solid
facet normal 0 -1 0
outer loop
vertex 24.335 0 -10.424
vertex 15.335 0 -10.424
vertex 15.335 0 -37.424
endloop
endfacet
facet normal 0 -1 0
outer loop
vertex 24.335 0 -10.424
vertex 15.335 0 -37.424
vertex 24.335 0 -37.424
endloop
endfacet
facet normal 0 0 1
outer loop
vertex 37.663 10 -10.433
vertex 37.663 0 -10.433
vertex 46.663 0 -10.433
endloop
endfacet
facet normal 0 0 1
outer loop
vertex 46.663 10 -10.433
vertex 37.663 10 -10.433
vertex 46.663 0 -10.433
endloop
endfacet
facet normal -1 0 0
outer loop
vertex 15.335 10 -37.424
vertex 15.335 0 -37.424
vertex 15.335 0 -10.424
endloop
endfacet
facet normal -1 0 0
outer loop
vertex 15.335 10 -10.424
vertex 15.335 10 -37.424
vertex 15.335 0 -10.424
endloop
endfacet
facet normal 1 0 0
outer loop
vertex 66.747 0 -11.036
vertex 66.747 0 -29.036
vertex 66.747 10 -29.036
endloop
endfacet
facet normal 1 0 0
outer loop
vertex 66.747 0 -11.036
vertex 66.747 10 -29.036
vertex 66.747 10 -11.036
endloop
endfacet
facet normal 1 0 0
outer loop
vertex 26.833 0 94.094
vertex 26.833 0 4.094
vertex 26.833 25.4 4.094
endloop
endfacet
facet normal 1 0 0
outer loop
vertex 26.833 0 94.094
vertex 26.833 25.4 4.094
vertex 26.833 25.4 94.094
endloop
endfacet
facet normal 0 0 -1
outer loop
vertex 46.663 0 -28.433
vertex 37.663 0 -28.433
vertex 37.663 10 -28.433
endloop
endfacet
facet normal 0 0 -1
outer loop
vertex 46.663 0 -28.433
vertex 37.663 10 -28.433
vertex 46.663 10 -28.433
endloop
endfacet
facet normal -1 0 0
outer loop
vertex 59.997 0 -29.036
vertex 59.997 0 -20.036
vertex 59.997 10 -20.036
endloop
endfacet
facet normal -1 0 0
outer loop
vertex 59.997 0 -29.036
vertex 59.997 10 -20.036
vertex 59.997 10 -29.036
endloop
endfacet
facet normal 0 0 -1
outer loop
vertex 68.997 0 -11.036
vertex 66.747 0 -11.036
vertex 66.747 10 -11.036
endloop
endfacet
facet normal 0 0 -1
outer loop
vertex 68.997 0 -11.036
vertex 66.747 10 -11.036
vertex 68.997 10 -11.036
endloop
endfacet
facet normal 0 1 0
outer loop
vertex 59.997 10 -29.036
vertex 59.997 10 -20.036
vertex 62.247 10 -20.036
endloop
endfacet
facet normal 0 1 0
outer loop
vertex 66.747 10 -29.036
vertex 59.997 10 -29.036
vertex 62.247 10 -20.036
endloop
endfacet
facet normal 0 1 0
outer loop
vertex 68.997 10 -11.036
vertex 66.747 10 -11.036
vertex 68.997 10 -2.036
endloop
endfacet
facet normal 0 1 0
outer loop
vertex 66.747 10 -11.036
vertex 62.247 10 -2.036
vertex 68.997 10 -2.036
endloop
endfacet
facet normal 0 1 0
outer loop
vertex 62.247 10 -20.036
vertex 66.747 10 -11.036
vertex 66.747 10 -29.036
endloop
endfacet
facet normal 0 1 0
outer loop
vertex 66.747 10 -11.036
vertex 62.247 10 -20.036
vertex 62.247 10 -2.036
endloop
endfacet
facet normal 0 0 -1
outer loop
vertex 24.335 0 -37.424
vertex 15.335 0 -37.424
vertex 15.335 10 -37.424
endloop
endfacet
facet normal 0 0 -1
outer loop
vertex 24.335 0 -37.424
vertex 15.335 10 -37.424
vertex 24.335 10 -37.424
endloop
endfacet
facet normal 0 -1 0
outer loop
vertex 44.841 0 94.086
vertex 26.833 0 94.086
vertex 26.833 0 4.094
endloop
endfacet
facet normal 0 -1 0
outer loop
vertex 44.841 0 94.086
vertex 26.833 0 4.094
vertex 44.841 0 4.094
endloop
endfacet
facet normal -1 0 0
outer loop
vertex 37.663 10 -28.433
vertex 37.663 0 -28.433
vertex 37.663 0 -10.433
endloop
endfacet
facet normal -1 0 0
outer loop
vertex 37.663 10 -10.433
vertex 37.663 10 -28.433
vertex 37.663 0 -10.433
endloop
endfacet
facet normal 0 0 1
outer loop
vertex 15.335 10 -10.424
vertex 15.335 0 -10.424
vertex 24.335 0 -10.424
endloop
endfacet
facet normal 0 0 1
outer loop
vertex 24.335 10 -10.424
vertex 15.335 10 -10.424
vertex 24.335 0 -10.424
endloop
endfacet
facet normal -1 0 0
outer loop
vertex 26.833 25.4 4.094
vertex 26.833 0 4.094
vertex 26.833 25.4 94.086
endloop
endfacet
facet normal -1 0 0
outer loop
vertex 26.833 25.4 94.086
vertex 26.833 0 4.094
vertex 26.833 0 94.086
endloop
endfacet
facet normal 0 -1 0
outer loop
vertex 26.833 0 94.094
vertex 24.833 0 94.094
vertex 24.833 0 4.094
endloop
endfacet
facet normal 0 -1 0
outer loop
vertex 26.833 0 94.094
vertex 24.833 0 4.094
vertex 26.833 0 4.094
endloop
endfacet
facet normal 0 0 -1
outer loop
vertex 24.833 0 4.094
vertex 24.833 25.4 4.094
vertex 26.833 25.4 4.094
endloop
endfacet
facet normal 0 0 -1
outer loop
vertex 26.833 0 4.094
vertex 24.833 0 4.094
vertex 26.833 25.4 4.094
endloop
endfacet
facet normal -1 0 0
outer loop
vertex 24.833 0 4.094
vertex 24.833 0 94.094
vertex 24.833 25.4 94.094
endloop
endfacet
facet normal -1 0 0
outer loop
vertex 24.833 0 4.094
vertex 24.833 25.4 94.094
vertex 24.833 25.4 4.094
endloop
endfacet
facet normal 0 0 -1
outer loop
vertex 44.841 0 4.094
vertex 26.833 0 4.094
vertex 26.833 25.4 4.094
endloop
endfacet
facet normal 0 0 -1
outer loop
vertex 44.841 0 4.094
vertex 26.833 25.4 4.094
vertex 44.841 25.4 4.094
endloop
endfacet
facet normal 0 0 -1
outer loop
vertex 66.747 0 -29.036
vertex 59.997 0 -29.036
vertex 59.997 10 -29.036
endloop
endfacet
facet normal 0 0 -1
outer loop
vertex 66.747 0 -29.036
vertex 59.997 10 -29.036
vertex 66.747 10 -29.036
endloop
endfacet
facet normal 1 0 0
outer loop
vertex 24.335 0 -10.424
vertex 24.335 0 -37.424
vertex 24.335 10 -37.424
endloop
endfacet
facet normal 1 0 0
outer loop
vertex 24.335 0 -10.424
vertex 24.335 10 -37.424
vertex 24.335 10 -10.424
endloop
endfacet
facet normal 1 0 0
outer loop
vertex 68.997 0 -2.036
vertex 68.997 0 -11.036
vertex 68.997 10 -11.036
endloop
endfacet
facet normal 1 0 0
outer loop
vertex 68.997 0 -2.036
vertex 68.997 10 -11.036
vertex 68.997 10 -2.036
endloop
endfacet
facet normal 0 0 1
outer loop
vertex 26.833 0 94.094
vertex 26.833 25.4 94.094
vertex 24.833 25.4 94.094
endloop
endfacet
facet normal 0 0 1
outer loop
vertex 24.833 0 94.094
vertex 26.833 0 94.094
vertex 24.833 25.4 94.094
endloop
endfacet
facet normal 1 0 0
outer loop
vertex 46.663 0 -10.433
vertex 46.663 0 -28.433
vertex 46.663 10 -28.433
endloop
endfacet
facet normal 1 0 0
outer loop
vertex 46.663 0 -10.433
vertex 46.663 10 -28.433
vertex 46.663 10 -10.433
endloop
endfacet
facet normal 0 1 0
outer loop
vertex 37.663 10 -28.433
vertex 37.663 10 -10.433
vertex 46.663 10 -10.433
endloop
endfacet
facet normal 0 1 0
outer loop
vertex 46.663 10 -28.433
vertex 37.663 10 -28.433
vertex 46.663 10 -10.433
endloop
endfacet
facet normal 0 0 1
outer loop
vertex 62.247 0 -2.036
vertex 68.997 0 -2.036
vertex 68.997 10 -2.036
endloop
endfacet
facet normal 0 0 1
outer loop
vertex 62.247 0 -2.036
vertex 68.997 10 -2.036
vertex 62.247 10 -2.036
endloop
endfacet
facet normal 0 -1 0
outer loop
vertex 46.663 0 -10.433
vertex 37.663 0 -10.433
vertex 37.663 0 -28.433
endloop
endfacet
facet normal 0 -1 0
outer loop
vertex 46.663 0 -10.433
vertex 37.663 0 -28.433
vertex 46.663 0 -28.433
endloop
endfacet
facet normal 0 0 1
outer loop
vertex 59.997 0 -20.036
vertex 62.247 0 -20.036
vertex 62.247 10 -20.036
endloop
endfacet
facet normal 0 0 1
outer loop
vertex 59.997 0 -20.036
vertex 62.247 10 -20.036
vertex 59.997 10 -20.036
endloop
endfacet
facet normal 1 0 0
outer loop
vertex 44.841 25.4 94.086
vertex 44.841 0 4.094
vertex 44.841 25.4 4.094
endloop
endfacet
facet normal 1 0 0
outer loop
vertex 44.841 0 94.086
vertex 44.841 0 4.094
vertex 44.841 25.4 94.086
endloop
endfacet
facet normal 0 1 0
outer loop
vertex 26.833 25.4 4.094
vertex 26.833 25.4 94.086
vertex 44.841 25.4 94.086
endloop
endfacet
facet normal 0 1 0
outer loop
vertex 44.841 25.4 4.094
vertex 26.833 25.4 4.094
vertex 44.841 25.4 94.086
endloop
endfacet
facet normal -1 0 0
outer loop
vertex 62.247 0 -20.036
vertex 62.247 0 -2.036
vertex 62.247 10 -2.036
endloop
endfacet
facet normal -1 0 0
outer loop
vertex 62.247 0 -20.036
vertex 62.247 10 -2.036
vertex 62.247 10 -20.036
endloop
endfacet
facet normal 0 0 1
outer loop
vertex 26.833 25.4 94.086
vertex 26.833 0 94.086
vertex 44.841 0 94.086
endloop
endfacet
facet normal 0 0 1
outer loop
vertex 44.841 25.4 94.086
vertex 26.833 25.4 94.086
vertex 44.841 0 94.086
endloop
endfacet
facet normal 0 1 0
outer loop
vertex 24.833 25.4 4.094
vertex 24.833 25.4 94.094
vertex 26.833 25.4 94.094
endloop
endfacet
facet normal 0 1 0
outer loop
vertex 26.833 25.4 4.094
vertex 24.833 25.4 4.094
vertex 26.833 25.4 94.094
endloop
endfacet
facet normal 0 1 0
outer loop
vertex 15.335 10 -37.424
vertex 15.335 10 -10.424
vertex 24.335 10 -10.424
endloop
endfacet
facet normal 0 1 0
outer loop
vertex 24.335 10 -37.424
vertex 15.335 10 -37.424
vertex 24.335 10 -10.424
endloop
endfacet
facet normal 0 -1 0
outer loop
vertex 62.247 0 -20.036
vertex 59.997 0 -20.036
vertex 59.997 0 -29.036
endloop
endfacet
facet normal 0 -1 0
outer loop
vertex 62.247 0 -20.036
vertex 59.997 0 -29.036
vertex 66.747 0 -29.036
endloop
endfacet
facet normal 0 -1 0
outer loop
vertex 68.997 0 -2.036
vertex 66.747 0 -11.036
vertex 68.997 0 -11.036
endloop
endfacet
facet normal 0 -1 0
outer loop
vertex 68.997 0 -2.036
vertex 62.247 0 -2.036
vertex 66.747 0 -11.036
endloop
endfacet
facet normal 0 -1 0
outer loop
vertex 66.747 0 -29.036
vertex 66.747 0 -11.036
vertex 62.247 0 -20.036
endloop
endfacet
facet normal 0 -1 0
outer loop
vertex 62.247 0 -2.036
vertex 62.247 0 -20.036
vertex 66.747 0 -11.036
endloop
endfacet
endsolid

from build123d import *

# Parameters (mm, degrees)
F0_W     = 9
F0_H     = 27
F1_DEPTH = 10
F2_W     = 9
F2_H     = 18
F3_DEPTH = 10
F5_DEPTH = 10
F6_W     = 18.0086
F6_H     = 89.9922
F7_DEPTH = 25.4
F8_DEPTH = 25.4


with BuildPart() as f1:
    # F0 (on Front) → F1 (new body)
    with BuildSketch(Plane.XZ):
        with Locations((19.834839, -23.924032)):
            Rectangle(F0_W, F0_H)
    extrude(amount=-F1_DEPTH)


with BuildPart() as f3:
    # F2 (on Front) → F3 (new body)
    with BuildSketch(Plane.XZ):
        with Locations((42.162936, -19.43305)):
            Rectangle(F2_W, F2_H)
    extrude(amount=-F3_DEPTH)


with BuildPart() as f5:
    # F4 (on Front) → F5 (new body)
    with BuildSketch(Plane.XZ):
        Polygon((59.997173, -20.035636), (59.997173, -29.035636), (66.747173, -29.035636), (66.747173, -11.035636), (68.997173, -11.035636), (68.997173, -2.035636), (62.247173, -2.035636), (62.247173, -20.035636), align=None)
    extrude(amount=-F5_DEPTH)


with BuildPart() as f7:
    # F6 (on face) → F7 (new body)
    with BuildSketch(Plane.XZ):
        with Locations((35.837151, 49.090376)):
            Rectangle(F6_W, F6_H)
    extrude(amount=-F7_DEPTH)


with BuildPart() as f8:
    # F6 (on face) → F8 (new body)
    with BuildSketch(Plane.XZ):
        Polygon((26.832851, 4.094276), (26.832851, 94.086476), (26.832851, 94.094276), (24.832851, 94.094276), (24.832851, 4.094276), align=None)
    extrude(amount=-F8_DEPTH)


solid = Compound([f1.part, f3.part, f5.part, f7.part, f8.part])
